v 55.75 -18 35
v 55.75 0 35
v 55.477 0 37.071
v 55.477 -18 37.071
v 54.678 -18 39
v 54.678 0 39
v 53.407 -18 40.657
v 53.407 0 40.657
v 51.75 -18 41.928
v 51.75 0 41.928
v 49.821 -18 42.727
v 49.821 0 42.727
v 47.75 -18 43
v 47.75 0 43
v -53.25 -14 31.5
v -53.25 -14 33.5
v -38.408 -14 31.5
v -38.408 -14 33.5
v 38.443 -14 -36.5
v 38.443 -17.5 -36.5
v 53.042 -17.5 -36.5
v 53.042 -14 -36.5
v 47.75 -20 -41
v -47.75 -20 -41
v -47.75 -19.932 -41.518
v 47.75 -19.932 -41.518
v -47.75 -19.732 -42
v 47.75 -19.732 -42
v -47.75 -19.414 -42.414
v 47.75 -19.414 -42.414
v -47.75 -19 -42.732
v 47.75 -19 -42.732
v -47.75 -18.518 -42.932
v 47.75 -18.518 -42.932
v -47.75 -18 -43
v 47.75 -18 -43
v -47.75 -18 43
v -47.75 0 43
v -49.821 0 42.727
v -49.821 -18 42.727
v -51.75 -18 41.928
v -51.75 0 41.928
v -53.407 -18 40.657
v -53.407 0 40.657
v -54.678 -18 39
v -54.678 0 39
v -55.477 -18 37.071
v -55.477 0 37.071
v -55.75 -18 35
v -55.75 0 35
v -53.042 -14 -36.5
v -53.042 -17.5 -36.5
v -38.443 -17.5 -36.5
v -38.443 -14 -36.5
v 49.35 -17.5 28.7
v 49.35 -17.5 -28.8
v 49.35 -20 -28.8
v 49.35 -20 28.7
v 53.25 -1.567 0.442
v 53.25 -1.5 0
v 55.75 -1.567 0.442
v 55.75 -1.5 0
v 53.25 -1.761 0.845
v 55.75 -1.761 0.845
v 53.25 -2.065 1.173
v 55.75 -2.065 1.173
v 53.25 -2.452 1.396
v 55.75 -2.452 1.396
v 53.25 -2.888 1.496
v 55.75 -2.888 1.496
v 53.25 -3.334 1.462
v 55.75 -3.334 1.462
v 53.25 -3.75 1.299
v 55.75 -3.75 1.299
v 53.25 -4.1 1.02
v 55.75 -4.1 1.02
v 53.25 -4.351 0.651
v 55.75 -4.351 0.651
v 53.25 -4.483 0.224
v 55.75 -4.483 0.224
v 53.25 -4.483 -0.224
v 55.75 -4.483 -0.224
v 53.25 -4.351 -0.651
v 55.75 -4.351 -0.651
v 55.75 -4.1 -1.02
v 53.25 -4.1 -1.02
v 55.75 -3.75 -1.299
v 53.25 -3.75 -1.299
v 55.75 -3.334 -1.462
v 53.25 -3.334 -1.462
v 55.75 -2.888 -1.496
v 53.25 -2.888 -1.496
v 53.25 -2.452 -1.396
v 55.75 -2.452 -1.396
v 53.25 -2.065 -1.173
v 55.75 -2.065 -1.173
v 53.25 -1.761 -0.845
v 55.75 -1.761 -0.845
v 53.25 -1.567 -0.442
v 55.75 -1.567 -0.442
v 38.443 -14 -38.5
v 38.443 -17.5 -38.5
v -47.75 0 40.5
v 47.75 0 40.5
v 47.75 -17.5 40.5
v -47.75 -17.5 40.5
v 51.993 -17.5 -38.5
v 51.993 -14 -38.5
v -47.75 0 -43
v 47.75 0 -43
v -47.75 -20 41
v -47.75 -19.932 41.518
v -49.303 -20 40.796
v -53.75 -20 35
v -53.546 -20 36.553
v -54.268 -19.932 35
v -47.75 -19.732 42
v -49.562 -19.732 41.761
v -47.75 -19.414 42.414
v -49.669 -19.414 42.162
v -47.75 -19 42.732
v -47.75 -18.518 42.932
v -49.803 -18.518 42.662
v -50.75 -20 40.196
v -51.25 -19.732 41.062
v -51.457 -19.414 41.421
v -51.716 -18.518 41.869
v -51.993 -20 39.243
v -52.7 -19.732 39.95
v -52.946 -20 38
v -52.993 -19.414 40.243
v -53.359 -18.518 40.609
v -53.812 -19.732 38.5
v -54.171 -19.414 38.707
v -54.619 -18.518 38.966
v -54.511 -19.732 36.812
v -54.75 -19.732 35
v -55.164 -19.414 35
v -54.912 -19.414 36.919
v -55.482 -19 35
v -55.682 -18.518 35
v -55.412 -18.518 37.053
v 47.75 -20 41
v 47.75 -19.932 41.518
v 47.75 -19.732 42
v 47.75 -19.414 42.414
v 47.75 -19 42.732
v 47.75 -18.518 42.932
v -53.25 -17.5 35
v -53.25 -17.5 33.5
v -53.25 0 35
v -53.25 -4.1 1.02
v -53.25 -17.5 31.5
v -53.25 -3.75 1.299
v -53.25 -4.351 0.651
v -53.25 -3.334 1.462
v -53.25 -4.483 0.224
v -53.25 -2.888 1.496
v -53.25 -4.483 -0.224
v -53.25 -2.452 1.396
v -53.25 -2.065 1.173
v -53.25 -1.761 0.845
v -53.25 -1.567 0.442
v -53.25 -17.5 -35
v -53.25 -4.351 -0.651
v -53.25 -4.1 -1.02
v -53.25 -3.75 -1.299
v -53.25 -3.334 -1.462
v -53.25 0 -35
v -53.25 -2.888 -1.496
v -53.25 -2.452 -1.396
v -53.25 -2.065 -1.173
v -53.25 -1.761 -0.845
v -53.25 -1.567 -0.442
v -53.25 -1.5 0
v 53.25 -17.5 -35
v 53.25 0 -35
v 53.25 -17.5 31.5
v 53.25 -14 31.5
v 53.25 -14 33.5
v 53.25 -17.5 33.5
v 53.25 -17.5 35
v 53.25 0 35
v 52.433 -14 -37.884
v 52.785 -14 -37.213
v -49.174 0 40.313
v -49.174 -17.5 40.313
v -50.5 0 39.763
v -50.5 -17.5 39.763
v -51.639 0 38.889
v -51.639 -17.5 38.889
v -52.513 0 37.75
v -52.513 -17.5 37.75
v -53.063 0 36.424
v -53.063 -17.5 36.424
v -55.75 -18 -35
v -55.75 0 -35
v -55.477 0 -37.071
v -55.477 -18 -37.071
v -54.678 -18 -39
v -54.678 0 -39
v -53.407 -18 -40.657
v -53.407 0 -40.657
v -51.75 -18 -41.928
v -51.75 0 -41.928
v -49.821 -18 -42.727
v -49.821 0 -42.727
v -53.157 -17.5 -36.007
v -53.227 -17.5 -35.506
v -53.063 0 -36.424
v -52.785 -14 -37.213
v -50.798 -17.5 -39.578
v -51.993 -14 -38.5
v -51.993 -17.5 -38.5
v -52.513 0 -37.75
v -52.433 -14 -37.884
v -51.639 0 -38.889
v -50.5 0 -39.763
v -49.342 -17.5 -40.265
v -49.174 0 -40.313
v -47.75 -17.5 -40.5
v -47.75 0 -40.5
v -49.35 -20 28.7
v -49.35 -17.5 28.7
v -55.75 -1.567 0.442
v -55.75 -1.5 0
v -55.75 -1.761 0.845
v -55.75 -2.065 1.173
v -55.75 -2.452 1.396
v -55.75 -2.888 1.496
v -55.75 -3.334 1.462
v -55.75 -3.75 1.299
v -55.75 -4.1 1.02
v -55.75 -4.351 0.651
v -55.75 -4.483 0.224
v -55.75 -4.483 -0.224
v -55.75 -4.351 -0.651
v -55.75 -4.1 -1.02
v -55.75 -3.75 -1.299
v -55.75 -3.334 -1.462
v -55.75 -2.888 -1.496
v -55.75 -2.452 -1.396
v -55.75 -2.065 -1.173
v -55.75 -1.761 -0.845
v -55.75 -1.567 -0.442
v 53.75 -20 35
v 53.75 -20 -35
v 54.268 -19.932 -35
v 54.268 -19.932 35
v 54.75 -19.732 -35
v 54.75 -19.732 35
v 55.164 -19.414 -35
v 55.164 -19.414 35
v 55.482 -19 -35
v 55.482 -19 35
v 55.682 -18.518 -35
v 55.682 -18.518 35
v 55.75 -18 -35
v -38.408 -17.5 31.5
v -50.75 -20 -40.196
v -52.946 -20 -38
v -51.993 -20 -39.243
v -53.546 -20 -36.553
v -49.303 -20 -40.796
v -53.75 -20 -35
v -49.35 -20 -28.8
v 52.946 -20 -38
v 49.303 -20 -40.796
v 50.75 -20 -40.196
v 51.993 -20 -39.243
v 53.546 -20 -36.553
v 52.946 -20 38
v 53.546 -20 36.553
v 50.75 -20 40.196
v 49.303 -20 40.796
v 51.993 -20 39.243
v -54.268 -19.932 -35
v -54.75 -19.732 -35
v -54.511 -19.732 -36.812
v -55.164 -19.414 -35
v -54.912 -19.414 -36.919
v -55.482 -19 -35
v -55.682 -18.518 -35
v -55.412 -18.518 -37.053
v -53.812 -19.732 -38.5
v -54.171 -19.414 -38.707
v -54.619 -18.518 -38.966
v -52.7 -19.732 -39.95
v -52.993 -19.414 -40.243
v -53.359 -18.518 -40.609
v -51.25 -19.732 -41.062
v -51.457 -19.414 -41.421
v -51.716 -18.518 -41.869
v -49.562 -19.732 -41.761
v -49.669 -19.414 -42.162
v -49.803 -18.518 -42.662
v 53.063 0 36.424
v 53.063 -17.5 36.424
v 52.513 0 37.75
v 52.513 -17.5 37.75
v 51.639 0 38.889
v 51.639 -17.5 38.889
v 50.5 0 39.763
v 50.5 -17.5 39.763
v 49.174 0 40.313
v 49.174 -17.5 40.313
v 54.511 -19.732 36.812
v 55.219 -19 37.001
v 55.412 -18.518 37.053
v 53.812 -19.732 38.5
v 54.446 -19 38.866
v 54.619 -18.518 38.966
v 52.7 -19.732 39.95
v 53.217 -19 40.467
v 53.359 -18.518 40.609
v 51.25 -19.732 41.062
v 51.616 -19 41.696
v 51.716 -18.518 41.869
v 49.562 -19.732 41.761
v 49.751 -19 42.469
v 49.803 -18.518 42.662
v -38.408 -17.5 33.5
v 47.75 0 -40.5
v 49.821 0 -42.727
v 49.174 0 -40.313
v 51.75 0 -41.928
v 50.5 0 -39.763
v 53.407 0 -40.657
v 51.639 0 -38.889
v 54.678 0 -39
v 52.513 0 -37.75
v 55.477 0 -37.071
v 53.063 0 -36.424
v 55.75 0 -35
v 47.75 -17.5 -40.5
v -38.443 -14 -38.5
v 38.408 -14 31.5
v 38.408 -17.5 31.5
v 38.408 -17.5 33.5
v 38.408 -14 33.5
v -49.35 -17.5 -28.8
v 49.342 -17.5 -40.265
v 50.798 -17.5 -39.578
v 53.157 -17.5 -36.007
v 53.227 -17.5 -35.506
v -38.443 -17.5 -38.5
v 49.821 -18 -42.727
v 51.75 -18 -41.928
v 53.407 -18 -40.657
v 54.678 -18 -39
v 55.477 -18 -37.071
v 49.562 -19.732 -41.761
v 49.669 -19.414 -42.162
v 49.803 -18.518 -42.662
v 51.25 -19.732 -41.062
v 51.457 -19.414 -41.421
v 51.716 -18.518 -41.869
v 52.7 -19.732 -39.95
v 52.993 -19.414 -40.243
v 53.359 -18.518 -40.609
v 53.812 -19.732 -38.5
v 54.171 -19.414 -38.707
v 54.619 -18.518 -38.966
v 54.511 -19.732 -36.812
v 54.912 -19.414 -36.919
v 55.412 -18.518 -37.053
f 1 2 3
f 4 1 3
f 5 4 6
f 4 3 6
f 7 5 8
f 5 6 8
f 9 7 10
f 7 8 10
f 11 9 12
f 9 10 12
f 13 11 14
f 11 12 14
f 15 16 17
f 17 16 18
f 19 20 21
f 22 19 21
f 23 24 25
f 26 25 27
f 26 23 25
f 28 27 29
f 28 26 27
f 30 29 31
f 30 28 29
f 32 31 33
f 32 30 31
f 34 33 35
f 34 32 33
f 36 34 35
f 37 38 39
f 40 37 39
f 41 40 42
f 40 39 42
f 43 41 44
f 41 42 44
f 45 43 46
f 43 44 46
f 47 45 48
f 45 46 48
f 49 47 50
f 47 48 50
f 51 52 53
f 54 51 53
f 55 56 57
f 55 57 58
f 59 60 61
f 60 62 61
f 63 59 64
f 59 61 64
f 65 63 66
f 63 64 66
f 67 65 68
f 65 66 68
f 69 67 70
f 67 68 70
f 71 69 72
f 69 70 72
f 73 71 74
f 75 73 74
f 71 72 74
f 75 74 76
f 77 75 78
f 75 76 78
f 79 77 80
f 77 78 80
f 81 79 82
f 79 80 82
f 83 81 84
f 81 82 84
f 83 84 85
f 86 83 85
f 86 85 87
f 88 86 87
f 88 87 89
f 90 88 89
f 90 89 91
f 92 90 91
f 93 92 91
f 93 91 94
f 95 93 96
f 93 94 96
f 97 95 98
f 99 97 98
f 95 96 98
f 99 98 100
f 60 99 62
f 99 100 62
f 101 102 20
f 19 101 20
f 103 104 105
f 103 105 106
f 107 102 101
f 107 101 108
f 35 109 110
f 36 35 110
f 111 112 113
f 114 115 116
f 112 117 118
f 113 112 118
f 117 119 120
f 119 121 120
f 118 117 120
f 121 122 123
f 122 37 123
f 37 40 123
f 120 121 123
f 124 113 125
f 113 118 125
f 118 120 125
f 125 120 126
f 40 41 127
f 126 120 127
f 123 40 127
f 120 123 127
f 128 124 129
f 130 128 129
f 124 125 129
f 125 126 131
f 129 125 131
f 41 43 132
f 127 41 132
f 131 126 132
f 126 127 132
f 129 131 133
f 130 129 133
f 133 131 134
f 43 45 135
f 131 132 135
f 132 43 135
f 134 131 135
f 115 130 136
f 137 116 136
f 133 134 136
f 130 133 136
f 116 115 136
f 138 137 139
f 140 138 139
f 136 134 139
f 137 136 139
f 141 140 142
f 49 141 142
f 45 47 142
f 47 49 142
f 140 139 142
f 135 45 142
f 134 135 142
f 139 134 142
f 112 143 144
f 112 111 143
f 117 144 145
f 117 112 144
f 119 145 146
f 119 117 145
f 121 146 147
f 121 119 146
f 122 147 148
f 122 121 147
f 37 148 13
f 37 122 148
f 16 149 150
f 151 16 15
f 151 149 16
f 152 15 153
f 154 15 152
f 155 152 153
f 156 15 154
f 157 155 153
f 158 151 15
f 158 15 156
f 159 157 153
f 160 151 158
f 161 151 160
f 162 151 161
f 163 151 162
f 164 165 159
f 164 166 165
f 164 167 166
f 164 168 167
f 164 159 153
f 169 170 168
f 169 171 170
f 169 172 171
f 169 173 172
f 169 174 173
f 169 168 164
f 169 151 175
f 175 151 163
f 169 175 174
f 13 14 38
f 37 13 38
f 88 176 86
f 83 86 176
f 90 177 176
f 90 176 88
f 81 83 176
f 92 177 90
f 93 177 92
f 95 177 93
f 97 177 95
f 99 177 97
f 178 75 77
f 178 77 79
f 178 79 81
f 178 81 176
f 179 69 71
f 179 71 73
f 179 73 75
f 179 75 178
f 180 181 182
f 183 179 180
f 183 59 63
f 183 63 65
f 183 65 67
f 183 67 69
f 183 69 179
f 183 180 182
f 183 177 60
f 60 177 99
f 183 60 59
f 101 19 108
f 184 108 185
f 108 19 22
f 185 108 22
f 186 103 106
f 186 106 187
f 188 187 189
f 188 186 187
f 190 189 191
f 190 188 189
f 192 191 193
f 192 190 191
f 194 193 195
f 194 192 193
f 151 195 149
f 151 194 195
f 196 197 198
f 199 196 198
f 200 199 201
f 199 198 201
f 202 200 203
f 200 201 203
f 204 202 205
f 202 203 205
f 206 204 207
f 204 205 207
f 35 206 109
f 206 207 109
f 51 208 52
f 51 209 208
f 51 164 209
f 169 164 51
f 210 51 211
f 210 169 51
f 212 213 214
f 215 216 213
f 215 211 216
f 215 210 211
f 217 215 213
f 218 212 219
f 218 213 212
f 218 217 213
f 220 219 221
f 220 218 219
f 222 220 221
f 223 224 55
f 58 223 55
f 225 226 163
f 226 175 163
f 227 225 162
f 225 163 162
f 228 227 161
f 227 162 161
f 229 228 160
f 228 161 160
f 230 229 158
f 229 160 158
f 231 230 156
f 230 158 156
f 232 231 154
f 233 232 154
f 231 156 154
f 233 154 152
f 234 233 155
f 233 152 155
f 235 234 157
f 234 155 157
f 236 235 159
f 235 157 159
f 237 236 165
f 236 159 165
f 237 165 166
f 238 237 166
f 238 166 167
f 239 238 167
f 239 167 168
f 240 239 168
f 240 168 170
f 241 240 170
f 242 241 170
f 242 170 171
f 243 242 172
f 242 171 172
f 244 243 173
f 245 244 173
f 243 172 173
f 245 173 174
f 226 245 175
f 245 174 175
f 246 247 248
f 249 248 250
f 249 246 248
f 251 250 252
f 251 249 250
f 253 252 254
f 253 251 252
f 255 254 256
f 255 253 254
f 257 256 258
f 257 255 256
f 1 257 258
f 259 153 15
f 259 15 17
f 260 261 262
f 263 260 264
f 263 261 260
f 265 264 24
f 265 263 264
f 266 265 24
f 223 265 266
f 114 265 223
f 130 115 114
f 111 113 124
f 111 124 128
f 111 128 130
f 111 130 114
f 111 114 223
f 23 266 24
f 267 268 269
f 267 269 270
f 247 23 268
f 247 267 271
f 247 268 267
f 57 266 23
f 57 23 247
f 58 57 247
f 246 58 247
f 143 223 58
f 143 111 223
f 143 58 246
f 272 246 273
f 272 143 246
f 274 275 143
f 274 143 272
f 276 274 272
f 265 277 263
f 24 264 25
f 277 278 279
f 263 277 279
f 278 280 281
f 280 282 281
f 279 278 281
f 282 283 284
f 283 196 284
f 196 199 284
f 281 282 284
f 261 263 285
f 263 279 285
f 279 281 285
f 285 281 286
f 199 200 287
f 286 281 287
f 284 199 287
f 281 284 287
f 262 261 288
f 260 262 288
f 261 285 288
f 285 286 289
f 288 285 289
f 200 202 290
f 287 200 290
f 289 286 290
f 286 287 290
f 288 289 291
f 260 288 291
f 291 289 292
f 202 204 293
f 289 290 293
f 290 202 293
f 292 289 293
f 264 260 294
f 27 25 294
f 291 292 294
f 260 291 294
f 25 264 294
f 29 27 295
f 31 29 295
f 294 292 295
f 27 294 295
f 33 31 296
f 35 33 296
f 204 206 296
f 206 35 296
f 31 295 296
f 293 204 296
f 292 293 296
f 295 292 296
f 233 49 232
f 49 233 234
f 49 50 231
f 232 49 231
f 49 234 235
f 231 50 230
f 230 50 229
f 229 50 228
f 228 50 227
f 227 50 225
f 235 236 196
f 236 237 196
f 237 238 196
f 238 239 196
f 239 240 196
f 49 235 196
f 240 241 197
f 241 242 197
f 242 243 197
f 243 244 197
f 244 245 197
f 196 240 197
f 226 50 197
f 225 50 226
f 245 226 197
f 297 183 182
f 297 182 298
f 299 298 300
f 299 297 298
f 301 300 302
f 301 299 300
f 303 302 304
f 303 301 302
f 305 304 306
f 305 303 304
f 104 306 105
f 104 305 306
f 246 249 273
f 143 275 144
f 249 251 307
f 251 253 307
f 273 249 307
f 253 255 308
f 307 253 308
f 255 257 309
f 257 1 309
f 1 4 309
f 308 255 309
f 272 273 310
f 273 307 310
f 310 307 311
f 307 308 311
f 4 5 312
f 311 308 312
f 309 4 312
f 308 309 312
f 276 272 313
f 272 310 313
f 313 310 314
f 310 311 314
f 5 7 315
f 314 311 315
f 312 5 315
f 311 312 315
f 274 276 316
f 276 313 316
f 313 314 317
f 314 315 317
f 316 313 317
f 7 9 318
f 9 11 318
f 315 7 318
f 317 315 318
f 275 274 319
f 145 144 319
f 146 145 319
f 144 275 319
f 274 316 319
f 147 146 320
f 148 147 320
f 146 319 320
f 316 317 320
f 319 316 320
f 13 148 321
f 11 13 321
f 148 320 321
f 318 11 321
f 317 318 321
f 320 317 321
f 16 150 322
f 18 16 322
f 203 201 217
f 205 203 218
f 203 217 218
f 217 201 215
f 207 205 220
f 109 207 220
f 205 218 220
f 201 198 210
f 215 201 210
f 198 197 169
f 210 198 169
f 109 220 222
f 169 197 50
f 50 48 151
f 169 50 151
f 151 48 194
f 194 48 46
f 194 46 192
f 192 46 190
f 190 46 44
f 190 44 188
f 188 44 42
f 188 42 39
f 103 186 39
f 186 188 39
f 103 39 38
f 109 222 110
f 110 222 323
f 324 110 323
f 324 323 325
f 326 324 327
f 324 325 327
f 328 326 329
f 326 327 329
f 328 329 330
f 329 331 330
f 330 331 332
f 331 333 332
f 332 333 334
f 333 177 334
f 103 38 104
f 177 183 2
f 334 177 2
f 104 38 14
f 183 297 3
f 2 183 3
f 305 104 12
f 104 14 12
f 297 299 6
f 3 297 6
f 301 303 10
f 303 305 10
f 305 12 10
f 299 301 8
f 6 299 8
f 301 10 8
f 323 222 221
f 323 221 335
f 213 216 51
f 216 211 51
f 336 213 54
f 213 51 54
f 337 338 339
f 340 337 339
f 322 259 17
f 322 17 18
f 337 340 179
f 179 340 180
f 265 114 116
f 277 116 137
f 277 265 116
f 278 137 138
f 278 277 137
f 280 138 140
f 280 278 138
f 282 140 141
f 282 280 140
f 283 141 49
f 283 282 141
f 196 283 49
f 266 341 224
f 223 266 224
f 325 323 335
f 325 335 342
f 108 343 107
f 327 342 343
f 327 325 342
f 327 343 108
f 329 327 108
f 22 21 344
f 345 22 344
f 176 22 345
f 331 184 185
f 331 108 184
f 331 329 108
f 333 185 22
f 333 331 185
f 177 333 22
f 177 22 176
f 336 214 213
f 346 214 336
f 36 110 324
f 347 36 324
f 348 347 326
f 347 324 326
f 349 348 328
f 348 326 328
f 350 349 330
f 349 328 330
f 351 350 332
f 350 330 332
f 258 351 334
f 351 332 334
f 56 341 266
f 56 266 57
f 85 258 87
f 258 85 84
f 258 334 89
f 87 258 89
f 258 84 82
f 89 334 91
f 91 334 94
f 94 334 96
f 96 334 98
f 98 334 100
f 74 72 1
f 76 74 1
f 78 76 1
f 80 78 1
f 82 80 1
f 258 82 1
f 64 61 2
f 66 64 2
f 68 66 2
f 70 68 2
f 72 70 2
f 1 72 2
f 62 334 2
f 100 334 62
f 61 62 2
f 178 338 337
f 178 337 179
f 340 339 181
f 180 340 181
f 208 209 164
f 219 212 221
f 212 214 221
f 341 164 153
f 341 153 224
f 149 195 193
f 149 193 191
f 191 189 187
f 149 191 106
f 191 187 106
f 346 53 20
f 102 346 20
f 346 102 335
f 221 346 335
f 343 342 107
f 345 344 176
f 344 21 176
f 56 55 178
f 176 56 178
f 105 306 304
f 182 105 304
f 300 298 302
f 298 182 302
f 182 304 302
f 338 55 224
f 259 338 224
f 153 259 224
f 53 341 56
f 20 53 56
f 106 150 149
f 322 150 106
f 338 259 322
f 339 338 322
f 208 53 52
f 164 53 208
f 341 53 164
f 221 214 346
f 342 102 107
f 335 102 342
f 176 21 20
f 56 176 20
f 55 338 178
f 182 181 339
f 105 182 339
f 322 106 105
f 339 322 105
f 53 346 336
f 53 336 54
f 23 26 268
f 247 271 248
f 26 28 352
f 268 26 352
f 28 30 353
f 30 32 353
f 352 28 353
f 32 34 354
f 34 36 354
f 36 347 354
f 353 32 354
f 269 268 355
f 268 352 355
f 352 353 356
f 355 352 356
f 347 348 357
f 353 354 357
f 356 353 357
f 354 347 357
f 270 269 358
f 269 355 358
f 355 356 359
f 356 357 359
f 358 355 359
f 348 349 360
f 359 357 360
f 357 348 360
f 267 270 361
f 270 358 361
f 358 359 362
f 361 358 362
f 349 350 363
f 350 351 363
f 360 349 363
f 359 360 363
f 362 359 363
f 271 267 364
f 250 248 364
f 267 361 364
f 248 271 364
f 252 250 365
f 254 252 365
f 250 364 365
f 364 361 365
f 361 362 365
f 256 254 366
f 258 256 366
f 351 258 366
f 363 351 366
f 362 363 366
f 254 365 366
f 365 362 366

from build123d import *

# Parameters (mm, degrees)
F1_DEPTH  = 20
F2_T      = -2.5
F5_W      = 98.7
F5_H      = 57.5
F6_DEPTH  = 50
F7_W      = 15
F7_H      = 2
F8_DEPTH  = 6
F11_R     = 2
F12_R     = 1.5
F13_DEPTH = 70


with BuildPart() as f1:
    # F0 (on Front) → F1 (new body)
    with BuildSketch(Plane.XZ):
        with BuildLine():
            Line((47.75, 43), (-47.75, 43))
            ThreePointArc((-47.75, 43), (-53.406854, 40.656854), (-55.75, 35))
            Line((-55.75, 35), (-55.75, -35))
            ThreePointArc((-55.75, -35), (-53.406854, -40.656854), (-47.75, -43))
            Line((-47.75, -43), (47.75, -43))
            ThreePointArc((47.75, -43), (53.406854, -40.656854), (55.75, -35))
            Line((55.75, -35), (55.75, 35))
            ThreePointArc((55.75, 35), (53.406854, 40.656854), (47.75, 43))
        make_face()
    extrude(amount=F1_DEPTH)

    # F2
    f2_openings = [f1.faces().sort_by_distance(p)[0] for p in [
        (0, 0, 0),
    ]]
    offset(amount=F2_T, openings=f2_openings)

    # F5 (on Front) → F6 (cut)
    with BuildSketch(Plane.XZ):
        with Locations((0, -0.05)):
            Rectangle(F5_W, F5_H)
    extrude(amount=F6_DEPTH, mode=Mode.SUBTRACT)

    # F7 (on offset) → F8 (join)
    with BuildSketch(Plane.XZ.offset(20)):
        with Locations((45.943302, -37.5)):
            Rectangle(F7_W, F7_H)
        with Locations((-45.943302, -37.5)):
            Rectangle(F7_W, F7_H)
        with Locations((45.908305, 32.5)):
            Rectangle(F7_W, F7_H)
        with Locations((-45.908305, 32.5)):
            Rectangle(F7_W, F7_H)
    extrude(amount=-F8_DEPTH)

    # F11
    f11_edges = [f1.edges().sort_by_distance(p)[0] for p in [
        (0, -20, 43),
        (55.75, -20, 0),
    ]]
    fillet(f11_edges, radius=F11_R)

    # F12 (on Right) → F13 (cut, symmetric)
    with BuildSketch(Plane.YZ):
        with Locations((-3, 0)):
            Circle(F12_R)
    extrude(amount=F13_DEPTH, both=True, mode=Mode.SUBTRACT)


solid = f1.part
